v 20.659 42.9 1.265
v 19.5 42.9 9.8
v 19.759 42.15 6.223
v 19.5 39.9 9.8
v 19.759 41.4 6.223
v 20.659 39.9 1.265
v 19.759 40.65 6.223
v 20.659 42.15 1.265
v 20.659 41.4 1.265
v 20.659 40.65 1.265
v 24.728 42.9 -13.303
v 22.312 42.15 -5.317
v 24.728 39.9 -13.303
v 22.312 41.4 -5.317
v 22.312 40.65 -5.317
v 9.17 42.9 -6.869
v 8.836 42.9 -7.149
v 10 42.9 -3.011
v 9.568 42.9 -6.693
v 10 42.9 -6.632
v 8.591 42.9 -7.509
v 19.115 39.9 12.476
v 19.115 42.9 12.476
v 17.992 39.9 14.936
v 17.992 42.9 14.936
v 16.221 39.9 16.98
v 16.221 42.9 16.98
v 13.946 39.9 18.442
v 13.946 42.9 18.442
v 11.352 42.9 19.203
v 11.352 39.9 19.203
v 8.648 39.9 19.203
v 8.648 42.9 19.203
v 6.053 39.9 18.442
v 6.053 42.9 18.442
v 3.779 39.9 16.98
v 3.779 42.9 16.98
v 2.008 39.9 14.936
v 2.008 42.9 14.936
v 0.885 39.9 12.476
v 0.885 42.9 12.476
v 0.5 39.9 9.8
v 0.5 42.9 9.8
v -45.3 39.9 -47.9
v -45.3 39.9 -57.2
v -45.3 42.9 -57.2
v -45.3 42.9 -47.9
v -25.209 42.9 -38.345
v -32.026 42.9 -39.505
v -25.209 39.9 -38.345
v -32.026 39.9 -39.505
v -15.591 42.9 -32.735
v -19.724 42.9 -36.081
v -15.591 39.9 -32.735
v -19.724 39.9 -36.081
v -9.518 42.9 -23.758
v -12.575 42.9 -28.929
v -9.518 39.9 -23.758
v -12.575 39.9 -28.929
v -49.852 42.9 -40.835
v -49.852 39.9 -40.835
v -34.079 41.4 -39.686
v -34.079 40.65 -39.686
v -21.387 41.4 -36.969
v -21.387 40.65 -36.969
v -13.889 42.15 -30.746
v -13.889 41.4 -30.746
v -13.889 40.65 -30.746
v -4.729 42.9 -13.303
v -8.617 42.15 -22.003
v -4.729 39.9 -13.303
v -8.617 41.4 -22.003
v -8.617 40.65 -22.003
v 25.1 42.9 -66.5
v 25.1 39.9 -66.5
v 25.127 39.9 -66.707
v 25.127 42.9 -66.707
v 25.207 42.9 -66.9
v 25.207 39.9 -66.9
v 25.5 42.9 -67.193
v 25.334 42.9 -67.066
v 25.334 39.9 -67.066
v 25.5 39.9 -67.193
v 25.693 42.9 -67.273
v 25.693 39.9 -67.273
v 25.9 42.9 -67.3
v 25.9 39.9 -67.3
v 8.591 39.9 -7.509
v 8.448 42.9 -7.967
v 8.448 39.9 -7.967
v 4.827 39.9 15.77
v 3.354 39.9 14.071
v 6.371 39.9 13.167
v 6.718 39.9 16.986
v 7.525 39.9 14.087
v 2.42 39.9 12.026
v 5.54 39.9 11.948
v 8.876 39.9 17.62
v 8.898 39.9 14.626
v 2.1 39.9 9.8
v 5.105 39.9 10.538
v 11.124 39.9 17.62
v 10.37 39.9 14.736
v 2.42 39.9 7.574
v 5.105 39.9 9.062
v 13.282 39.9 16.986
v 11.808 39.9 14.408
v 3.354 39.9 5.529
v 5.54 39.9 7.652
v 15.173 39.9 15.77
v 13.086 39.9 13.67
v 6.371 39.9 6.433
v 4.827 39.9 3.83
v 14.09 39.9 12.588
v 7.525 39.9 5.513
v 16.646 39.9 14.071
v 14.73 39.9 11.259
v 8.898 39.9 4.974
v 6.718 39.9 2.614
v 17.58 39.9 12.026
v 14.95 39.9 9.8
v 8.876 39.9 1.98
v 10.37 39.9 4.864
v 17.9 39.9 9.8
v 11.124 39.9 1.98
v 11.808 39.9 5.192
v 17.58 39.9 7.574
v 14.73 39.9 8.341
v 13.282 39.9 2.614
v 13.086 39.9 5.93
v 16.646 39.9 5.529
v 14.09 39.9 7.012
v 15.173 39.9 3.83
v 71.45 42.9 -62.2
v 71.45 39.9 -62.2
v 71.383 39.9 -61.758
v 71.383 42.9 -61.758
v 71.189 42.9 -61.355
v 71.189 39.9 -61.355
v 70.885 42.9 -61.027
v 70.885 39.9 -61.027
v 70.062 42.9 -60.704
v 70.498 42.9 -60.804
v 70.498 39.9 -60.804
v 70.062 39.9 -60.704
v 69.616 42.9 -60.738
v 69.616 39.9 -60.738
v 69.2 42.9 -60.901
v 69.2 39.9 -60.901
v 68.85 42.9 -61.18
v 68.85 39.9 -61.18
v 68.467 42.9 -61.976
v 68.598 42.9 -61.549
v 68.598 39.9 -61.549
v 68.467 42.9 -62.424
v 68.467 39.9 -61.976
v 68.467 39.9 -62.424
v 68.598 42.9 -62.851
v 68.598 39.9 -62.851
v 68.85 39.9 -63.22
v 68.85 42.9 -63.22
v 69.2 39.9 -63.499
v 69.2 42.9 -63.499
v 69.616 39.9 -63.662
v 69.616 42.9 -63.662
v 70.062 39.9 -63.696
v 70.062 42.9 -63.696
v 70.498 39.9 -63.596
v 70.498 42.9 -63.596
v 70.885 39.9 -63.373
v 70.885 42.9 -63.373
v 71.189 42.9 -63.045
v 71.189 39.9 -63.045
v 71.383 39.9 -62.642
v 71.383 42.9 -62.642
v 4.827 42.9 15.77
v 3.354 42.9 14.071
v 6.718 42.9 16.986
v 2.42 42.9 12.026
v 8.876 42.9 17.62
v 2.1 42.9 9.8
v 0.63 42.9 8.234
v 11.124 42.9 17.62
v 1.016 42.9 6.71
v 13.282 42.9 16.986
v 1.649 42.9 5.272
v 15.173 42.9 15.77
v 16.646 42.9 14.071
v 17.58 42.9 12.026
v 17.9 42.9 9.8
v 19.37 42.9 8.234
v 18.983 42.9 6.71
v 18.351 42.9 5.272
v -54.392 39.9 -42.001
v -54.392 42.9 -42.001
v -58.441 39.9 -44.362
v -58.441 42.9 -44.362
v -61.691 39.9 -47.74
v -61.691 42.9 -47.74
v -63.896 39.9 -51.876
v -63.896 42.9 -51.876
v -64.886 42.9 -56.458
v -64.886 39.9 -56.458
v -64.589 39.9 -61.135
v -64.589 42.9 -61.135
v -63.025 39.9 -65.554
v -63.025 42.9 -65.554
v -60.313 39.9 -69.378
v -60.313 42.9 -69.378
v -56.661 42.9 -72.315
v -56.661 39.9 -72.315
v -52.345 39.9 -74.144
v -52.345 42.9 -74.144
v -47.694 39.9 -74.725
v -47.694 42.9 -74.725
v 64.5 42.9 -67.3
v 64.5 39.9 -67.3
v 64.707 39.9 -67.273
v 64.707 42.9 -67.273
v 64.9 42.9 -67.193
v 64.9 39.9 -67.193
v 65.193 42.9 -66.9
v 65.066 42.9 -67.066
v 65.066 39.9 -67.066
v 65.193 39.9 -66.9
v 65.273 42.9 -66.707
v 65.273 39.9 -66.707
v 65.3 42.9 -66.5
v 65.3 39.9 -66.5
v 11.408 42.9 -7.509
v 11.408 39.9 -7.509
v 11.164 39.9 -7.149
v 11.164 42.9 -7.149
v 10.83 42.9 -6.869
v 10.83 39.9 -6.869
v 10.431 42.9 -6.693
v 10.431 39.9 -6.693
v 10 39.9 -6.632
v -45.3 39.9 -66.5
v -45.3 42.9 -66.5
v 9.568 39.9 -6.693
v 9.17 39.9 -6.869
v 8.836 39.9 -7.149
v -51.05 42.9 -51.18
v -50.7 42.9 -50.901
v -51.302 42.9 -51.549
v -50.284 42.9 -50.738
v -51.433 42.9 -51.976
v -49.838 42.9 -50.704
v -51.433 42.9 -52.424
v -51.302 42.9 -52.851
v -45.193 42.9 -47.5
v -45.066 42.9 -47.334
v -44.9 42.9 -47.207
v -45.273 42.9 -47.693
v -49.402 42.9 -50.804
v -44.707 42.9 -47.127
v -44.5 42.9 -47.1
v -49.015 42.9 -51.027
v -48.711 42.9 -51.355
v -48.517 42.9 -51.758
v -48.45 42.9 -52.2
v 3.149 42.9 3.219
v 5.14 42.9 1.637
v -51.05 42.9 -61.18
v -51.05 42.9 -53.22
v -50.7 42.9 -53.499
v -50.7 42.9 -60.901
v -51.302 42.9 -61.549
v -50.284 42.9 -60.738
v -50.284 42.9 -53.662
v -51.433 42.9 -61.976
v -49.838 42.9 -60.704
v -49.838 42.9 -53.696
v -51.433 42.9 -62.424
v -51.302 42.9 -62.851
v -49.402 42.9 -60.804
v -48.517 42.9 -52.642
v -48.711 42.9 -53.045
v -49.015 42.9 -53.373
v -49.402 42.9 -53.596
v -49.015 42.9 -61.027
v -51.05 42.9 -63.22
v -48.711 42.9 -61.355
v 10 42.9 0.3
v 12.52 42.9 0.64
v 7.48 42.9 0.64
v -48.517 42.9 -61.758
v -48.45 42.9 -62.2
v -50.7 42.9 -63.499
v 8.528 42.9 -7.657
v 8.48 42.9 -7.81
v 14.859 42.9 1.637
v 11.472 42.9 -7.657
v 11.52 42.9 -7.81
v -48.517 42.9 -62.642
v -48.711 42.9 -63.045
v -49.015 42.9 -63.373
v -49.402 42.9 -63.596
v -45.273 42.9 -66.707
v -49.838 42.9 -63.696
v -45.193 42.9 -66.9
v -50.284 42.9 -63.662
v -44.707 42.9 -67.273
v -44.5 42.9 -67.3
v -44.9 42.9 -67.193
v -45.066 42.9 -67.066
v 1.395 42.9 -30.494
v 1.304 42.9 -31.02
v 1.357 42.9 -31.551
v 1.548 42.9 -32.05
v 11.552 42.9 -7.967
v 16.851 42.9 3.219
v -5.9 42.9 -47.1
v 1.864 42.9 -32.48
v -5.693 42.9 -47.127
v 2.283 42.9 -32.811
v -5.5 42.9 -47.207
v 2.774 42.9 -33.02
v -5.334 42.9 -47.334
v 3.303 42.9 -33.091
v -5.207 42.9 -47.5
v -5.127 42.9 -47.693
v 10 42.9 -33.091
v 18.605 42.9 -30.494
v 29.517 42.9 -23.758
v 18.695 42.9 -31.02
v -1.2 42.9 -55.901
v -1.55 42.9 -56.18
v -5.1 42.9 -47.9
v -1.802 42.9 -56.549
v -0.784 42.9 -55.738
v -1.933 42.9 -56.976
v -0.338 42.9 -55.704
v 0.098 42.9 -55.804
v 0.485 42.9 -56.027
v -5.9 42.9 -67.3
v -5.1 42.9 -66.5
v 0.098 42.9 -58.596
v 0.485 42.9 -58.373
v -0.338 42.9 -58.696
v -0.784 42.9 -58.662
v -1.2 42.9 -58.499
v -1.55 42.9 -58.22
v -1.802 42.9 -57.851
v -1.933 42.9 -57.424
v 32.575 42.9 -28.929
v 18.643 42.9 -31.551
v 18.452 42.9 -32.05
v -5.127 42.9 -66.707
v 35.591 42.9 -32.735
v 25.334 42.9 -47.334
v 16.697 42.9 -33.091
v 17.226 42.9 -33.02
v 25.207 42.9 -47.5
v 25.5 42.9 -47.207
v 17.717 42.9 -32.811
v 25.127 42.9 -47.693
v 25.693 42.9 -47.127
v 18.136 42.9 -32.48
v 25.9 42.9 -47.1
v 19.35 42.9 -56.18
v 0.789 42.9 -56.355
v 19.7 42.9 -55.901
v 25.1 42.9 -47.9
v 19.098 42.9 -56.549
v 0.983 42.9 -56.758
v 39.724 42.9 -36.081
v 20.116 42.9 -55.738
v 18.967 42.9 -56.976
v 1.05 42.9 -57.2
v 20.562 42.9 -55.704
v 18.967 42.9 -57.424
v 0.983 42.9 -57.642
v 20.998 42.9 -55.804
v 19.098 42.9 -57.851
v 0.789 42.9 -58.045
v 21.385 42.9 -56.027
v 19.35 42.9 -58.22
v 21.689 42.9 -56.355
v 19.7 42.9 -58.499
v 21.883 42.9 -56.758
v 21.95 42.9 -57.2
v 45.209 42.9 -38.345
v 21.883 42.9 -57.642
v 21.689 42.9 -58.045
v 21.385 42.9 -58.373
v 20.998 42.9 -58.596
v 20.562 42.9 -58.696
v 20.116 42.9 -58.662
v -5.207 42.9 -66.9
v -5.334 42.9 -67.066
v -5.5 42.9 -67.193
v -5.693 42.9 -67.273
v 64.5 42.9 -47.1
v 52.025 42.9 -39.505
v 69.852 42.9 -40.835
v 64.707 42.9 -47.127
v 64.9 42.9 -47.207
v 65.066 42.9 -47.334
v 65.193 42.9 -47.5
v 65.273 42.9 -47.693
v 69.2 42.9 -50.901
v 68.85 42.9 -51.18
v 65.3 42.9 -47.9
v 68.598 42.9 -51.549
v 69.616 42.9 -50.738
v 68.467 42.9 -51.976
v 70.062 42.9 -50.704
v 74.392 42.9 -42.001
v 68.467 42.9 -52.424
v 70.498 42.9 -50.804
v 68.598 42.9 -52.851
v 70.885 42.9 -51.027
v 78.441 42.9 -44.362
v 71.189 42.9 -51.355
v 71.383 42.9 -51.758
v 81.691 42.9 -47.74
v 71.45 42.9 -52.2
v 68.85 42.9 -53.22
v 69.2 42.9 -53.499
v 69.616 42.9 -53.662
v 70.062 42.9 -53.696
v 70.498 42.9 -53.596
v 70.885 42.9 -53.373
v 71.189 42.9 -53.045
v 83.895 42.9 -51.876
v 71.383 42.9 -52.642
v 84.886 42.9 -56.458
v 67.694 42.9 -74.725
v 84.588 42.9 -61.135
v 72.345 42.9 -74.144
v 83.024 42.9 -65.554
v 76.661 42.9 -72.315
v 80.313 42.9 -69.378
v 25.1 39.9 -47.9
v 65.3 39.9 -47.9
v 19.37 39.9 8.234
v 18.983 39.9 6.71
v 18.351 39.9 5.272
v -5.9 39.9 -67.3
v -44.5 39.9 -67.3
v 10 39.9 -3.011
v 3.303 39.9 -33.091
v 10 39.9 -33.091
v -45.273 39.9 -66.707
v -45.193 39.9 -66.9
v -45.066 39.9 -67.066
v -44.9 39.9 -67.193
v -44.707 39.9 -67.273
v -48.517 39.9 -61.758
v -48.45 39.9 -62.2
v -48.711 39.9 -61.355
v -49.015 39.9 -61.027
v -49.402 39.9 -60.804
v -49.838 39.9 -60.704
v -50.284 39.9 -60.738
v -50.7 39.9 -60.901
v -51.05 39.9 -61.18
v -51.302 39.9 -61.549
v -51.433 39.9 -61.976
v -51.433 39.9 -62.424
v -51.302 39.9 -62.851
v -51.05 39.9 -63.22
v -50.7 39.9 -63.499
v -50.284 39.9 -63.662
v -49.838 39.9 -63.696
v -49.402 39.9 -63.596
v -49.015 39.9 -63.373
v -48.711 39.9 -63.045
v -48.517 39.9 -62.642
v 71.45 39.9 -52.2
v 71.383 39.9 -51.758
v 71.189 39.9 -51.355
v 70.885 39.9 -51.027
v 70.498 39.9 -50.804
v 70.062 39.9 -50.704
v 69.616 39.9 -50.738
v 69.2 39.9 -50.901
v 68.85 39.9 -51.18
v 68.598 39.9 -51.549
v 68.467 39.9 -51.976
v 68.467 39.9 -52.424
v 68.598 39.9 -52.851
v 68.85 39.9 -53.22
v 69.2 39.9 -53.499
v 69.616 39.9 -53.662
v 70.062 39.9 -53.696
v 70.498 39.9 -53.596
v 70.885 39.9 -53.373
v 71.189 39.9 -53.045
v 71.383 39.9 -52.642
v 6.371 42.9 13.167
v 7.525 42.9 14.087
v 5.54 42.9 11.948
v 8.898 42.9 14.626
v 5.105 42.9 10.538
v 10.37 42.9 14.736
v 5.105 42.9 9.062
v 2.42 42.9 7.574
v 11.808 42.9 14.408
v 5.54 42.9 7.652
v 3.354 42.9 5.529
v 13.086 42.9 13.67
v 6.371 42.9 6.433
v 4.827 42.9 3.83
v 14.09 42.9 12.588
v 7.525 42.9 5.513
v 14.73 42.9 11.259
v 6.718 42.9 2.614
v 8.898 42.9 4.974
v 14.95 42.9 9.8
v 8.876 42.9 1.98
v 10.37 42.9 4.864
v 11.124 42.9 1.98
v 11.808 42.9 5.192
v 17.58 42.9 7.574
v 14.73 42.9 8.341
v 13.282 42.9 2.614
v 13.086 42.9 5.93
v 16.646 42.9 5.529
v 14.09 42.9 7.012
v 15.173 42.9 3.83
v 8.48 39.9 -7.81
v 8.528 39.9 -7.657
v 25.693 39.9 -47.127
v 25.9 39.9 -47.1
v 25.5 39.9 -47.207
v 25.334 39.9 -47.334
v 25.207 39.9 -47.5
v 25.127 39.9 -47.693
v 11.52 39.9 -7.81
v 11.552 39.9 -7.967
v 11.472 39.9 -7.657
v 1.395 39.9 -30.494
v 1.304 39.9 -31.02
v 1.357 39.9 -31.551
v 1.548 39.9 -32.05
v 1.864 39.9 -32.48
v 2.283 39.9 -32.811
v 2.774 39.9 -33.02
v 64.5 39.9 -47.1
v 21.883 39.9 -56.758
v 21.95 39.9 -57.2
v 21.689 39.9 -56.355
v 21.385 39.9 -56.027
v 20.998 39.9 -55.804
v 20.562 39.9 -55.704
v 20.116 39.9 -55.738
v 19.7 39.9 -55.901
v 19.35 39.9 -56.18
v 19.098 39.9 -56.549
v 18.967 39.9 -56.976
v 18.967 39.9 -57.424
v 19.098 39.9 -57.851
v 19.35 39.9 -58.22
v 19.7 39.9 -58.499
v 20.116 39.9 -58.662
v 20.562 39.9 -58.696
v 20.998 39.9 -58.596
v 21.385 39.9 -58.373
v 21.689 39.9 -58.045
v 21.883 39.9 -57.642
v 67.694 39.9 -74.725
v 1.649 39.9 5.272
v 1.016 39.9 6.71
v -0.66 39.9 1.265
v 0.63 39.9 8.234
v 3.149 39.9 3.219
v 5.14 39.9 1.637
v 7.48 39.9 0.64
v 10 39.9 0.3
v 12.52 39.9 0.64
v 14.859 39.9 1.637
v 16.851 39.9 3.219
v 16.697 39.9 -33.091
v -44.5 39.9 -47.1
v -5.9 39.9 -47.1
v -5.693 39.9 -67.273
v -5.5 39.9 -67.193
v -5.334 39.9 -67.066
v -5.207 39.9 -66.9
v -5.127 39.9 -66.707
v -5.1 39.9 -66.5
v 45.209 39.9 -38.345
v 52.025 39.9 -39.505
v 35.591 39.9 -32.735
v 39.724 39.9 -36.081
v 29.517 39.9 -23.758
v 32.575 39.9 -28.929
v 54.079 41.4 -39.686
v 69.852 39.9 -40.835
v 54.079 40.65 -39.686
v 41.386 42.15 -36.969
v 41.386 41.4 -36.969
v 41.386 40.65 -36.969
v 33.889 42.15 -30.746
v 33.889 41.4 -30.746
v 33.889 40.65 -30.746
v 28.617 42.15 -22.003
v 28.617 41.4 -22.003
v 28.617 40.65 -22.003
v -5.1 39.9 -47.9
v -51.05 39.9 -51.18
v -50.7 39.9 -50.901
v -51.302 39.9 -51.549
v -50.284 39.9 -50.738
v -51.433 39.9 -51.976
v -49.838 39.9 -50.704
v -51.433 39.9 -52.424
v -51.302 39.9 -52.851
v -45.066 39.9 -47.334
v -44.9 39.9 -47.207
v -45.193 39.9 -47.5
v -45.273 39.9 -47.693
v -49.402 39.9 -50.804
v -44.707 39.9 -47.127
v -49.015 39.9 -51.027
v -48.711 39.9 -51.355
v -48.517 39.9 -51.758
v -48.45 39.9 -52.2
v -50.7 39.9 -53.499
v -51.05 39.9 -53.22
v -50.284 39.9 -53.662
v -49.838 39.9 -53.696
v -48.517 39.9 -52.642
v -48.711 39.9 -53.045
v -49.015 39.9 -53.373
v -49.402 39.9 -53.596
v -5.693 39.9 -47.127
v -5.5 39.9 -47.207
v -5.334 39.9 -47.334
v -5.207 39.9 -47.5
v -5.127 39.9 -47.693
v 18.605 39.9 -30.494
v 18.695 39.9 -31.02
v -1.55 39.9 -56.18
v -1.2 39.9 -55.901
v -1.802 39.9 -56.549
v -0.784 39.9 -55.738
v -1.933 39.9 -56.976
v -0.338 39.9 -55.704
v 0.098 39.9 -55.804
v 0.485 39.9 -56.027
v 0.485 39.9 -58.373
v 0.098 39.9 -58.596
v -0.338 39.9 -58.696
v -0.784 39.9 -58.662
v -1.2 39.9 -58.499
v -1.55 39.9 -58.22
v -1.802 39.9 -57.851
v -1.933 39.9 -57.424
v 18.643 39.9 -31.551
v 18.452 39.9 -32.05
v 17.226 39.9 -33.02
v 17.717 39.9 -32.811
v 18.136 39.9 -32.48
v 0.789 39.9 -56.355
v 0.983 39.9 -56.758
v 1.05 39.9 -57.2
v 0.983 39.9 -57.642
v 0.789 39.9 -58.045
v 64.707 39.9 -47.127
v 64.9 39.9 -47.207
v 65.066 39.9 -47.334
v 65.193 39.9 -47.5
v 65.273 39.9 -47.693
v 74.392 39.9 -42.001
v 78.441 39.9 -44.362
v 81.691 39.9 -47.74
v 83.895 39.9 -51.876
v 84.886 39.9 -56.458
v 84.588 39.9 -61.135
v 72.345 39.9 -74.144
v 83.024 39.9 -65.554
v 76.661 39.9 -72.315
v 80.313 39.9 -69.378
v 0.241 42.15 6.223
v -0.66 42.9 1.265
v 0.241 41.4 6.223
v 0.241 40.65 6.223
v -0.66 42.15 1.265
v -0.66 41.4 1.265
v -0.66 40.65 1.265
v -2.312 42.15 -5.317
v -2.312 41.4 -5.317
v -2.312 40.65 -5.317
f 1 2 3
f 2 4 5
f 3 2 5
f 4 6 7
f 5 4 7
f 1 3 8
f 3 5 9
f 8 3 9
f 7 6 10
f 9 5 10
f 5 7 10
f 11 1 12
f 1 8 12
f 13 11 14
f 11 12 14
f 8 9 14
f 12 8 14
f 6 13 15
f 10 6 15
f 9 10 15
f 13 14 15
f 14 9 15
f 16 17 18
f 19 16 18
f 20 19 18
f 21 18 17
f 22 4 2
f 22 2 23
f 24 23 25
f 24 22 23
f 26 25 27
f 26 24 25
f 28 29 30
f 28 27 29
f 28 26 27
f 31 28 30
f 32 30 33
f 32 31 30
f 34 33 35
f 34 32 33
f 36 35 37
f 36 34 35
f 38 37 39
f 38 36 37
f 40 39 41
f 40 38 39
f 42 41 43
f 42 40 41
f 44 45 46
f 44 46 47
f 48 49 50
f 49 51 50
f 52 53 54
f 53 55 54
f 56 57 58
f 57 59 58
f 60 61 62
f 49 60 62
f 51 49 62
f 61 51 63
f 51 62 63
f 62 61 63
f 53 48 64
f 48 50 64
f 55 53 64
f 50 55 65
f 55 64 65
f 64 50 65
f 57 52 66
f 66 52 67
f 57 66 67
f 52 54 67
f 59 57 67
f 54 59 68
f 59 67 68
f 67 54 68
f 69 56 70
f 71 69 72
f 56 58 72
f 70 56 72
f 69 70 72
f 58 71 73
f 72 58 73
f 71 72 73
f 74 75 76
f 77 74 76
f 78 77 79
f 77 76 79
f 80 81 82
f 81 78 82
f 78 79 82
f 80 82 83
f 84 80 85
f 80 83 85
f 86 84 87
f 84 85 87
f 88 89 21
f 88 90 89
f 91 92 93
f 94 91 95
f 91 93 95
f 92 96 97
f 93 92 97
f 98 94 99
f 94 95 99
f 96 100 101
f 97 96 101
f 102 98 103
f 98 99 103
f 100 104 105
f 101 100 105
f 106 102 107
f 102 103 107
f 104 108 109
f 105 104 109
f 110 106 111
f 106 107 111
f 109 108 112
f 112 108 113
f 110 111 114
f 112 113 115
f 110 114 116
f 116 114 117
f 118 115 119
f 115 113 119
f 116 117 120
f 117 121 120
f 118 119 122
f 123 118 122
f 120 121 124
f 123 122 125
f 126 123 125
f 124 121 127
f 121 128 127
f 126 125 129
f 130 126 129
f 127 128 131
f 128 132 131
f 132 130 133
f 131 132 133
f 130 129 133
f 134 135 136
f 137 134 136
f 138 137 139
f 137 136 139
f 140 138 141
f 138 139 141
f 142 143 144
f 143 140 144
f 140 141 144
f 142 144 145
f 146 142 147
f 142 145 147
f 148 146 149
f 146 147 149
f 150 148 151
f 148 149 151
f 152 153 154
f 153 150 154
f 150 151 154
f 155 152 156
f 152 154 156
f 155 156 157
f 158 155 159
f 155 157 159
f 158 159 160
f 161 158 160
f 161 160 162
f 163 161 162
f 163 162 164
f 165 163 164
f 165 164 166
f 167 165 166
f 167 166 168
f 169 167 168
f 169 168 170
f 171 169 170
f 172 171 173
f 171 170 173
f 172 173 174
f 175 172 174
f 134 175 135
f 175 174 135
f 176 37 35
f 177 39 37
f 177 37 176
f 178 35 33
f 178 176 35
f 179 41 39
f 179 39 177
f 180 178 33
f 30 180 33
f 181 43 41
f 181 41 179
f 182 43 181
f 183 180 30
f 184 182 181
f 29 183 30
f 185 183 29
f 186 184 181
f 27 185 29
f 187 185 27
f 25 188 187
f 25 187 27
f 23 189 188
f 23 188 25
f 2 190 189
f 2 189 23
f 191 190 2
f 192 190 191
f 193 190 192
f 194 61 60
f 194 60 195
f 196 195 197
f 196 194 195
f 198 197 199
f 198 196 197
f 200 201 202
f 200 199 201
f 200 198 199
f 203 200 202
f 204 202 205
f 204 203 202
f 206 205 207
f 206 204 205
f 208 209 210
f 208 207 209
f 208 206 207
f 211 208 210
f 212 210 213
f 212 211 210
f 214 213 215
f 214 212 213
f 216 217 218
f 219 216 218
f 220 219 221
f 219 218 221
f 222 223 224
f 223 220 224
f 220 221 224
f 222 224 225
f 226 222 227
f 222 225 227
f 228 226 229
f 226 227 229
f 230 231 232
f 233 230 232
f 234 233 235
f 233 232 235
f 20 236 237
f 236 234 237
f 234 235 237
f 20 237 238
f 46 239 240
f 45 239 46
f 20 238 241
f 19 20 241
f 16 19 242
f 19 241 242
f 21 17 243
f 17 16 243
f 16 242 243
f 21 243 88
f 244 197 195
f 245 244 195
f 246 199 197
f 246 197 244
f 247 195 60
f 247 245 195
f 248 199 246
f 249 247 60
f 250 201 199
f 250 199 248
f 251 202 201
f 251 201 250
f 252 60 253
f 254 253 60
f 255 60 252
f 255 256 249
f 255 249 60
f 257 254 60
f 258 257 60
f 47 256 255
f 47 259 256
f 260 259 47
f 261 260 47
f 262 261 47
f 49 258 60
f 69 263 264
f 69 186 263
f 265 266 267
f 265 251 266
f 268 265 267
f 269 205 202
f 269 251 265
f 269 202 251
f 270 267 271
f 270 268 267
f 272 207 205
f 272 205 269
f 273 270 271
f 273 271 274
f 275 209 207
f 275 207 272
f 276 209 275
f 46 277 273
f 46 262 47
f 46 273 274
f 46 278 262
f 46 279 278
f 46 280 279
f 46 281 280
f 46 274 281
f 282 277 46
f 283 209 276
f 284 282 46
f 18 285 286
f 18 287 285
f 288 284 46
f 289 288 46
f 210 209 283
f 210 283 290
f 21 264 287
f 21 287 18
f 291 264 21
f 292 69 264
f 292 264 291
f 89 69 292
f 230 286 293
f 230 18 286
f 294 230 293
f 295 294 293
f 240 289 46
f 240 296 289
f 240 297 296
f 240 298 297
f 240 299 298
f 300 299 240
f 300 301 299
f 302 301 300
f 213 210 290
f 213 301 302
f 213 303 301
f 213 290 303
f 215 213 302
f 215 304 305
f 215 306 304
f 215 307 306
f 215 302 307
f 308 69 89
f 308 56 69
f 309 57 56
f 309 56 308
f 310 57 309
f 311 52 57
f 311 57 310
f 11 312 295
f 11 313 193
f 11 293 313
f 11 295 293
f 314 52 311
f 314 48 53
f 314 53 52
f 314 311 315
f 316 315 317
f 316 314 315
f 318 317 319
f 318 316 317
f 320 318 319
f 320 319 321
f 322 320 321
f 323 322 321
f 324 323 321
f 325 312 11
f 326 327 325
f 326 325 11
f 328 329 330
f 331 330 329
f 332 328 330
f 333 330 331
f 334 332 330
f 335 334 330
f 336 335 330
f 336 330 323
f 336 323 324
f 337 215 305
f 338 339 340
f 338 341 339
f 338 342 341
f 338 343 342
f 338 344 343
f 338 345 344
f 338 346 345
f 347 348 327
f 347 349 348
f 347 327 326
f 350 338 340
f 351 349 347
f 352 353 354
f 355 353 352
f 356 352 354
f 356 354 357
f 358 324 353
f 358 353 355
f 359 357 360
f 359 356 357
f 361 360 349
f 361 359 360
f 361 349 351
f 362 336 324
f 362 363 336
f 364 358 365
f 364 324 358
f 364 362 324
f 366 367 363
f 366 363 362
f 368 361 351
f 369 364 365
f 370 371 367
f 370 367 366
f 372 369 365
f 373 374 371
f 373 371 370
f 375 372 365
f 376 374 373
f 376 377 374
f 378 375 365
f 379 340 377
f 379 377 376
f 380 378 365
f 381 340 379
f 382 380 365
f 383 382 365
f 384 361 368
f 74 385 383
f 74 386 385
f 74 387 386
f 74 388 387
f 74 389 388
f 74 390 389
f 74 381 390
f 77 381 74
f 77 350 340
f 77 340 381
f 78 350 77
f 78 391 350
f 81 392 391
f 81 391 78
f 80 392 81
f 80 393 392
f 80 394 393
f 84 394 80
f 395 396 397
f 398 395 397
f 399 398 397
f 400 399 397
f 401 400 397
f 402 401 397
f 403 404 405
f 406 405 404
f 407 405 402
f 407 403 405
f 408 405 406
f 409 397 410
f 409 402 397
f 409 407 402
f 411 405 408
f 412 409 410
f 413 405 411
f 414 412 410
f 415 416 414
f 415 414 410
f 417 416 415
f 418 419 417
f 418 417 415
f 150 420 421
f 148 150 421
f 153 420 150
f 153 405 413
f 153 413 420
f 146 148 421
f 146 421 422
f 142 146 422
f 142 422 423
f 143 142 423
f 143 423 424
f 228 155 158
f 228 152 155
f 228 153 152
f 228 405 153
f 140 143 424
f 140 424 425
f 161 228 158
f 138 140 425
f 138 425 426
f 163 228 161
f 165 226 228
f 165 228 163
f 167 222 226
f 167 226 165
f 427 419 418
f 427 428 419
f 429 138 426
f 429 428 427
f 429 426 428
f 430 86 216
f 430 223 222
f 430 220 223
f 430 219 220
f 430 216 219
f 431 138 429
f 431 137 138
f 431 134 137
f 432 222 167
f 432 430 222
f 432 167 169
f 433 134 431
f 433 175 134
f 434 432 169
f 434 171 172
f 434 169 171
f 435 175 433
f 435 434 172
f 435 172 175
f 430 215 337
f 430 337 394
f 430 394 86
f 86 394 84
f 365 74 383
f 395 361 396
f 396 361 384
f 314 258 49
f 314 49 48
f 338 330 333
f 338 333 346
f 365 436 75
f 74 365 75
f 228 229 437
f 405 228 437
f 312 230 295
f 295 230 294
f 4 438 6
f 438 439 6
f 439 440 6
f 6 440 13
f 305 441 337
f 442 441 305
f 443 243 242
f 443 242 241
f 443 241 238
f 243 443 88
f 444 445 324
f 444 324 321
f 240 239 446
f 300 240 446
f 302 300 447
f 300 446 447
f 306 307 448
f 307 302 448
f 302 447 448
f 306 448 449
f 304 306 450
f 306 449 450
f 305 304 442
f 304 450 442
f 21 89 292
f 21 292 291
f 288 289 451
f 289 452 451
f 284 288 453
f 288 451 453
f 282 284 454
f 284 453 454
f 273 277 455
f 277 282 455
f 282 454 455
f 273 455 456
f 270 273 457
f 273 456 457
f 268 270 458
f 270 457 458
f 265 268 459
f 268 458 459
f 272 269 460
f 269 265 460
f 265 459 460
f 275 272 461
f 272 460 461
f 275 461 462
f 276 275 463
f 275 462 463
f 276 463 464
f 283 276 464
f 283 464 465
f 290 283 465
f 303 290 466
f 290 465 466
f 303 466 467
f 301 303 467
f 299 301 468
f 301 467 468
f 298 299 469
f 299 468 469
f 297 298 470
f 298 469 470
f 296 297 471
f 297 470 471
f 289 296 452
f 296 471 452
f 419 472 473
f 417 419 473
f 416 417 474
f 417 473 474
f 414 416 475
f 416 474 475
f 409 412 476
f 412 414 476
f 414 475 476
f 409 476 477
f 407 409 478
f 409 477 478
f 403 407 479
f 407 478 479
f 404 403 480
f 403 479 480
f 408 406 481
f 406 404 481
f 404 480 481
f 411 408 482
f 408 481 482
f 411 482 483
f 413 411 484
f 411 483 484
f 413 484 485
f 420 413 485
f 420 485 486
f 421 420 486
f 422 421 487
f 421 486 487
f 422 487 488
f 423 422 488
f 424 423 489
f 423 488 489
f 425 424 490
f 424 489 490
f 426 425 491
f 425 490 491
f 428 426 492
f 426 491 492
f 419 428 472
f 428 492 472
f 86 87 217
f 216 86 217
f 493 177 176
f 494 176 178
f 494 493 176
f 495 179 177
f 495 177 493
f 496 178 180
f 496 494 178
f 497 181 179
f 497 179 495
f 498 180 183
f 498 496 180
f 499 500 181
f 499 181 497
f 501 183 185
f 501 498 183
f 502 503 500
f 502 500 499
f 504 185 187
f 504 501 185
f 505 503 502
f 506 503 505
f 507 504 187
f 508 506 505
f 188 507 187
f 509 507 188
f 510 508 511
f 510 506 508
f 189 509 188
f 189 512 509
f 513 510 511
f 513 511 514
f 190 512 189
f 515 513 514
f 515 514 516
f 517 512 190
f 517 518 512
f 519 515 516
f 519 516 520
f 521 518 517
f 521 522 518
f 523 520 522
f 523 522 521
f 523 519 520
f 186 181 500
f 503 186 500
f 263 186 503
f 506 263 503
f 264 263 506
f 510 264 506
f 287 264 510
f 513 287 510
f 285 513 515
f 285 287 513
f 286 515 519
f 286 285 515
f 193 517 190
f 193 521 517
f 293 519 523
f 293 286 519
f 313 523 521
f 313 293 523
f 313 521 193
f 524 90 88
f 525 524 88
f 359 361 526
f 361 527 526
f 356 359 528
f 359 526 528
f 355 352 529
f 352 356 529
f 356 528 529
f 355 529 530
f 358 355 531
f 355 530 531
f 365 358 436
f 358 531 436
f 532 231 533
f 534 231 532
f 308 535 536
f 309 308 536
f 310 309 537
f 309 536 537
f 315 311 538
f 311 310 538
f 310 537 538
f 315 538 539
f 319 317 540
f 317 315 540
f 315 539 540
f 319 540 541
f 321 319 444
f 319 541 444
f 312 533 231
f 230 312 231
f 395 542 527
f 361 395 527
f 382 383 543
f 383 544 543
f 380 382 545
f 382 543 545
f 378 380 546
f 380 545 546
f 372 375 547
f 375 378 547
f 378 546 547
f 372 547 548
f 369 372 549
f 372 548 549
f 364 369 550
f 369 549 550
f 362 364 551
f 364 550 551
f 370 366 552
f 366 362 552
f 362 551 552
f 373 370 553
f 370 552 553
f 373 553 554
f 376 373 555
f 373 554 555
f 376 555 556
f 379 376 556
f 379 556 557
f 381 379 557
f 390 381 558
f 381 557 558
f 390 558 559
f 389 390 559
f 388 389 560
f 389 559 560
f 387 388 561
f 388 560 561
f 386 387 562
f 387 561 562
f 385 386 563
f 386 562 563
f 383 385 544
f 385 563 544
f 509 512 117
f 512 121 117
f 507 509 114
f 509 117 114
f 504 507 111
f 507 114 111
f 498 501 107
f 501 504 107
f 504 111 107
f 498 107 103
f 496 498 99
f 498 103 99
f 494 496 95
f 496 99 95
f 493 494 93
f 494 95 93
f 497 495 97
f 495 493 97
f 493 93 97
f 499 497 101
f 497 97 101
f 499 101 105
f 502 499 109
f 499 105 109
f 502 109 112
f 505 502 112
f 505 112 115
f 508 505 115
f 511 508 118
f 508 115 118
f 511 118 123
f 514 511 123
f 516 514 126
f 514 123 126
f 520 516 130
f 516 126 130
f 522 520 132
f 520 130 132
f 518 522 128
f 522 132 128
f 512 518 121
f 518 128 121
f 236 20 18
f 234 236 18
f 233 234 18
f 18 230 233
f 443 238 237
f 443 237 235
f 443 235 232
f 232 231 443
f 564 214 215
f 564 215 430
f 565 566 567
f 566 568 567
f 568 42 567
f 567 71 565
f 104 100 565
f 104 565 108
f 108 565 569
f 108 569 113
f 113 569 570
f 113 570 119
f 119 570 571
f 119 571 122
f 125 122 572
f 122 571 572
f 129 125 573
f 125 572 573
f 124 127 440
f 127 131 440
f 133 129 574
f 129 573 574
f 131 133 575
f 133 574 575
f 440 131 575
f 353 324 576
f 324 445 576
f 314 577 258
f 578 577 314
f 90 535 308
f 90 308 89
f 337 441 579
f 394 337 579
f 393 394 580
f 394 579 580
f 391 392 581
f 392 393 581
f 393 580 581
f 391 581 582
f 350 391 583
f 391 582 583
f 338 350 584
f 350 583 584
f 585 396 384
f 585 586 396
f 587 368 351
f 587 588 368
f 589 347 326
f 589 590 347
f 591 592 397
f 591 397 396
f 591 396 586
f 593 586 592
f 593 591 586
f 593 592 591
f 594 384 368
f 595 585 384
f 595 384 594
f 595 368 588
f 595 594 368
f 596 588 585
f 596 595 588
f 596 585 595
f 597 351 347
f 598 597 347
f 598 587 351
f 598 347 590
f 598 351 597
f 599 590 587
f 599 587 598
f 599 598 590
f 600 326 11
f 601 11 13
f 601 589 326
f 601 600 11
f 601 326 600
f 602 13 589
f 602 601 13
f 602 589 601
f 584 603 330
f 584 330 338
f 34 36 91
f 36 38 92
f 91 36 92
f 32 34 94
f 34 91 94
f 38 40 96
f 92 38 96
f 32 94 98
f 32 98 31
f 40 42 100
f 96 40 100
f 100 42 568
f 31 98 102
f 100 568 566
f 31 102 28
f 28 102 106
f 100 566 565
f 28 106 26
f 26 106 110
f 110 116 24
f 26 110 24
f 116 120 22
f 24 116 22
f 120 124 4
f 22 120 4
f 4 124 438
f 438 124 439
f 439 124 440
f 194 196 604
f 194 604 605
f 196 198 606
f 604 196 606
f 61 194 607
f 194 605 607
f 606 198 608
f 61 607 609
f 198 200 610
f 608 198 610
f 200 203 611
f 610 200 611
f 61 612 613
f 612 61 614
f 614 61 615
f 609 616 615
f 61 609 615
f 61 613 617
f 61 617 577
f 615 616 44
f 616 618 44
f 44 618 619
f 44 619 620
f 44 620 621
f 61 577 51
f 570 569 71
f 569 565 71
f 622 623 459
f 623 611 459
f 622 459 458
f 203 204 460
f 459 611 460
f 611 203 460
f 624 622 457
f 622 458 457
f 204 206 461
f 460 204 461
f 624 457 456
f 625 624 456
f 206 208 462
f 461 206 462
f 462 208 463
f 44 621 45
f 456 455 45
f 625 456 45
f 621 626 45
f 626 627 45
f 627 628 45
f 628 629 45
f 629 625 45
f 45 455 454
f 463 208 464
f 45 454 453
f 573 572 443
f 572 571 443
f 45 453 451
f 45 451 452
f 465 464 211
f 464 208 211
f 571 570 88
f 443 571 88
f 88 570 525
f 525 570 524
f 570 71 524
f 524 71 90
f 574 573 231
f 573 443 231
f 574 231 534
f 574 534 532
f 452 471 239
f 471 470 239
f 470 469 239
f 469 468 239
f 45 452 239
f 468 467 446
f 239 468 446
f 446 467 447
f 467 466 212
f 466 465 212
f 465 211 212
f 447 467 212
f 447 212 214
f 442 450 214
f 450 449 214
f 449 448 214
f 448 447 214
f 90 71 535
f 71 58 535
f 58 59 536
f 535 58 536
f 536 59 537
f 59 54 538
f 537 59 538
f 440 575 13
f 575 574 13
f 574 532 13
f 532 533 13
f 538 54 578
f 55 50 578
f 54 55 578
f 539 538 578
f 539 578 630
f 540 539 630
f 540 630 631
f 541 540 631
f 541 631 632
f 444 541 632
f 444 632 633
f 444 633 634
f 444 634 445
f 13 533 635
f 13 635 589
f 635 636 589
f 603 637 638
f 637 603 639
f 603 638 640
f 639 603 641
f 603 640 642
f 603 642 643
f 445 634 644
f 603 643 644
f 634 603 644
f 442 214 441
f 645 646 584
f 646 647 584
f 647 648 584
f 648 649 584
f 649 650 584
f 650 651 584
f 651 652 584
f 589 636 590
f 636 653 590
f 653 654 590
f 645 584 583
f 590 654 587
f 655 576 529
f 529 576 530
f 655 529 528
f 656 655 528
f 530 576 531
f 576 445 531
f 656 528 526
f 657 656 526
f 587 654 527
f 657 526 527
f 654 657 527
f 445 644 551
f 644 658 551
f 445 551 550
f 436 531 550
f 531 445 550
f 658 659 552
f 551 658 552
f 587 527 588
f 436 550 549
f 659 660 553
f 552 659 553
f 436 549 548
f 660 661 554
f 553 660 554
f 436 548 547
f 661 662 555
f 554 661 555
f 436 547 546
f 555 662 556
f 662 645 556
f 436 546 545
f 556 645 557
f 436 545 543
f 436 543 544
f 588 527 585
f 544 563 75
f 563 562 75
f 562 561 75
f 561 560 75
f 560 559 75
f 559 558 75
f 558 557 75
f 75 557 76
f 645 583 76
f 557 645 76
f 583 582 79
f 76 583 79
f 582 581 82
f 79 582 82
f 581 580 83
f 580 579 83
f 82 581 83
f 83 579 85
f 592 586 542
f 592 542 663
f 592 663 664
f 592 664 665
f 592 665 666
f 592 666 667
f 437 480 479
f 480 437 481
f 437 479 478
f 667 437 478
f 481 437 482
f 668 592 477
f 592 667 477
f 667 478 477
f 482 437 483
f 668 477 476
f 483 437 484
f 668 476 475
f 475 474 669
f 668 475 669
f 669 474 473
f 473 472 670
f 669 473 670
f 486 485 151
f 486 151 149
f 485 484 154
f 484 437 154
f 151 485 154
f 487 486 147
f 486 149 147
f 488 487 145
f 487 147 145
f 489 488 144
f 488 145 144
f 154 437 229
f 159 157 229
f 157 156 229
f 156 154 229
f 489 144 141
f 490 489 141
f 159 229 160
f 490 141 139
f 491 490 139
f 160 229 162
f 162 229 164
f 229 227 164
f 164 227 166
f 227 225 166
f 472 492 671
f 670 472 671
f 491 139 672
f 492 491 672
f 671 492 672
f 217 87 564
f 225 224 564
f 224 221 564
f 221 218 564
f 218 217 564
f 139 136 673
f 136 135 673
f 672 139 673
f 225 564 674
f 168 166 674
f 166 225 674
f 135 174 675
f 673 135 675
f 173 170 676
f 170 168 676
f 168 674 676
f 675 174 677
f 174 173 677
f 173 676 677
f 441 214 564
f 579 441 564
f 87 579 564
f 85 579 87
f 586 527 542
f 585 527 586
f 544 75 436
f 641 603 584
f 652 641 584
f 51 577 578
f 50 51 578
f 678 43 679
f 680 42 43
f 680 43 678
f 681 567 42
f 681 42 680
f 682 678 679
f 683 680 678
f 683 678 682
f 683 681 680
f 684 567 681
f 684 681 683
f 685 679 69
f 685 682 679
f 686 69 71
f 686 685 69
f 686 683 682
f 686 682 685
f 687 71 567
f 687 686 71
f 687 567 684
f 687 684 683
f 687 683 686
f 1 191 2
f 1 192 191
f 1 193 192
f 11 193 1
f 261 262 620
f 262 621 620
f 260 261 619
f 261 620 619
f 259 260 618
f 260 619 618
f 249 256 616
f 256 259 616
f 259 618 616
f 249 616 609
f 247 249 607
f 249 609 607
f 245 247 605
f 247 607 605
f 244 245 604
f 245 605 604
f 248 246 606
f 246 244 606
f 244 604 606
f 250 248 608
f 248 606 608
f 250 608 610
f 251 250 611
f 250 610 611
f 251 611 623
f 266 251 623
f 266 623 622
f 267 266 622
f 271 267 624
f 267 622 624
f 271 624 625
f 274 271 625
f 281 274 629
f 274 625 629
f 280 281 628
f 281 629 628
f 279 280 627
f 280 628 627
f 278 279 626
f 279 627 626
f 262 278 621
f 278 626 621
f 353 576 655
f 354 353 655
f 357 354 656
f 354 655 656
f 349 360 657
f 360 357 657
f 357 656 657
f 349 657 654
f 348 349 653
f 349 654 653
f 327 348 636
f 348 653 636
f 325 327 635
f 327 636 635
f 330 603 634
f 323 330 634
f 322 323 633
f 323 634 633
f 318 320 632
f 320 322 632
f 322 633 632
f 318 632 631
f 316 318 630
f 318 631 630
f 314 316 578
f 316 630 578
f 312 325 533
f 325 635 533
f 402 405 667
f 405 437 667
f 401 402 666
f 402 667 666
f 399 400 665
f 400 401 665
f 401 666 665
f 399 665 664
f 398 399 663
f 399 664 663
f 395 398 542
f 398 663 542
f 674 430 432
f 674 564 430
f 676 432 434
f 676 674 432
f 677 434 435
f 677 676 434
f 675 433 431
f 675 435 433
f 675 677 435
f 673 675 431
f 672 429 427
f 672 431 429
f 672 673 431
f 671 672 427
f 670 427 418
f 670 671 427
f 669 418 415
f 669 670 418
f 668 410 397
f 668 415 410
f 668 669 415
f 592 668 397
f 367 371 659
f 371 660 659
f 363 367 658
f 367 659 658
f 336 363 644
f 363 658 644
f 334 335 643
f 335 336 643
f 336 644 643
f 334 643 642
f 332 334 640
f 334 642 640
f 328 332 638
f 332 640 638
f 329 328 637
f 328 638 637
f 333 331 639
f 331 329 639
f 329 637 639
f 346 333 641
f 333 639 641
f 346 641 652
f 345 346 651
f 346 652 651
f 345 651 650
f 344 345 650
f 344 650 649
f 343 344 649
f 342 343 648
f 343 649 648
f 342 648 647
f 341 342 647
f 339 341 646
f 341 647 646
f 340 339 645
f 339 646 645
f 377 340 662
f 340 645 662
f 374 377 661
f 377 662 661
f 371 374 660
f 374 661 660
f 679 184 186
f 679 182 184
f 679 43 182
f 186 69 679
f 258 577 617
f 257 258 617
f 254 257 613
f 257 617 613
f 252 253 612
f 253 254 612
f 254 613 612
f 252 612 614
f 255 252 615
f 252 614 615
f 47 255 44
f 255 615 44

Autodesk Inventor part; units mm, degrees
ref_plane "YZ Plane" through (0, 0, 0) normal (1, 0, 0) x (0, 1, 0)
ref_plane "XZ Plane" through (0, 0, 0) normal (0, 1, 0) x (-1, 0, 0)
ref_plane "Work Plane7" through (3.7071, 39.9, 0.5) normal (0, 1, 0) x (1, 0, 0)
sketch "Sketch4" plane through (3.7071, 39.9, 0.5) normal (0, 1, 0) x (1, 0, 0)
  circle A0 centre (6.2928, -9.3) radius 2.9
  circle A1 centre (6.2928, -9.3) radius 2.65
  line L0 (6.2928, -9.3) -> (6.2928, -8.1563)
  circle A2 centre (6.2928, -9.3) radius 1.5
  line L1 (5.9607, -6.6709) -> (6.3303, -6.4003)
  line L2 (6.6249, -6.6709) -> (6.3303, -6.4003)
  line L3 (5.3173, -6.8361) -> (5.608, -6.482)
  line L4 (5.9607, -6.6709) -> (5.608, -6.482)
  line L5 (4.7352, -7.1561) -> (4.9287, -6.7409)
  line L6 (5.3173, -6.8361) -> (4.9287, -6.7409)
  line L7 (4.2509, -7.6109) -> (4.3351, -7.1605)
  line L8 (4.7352, -7.1561) -> (4.3351, -7.1605)
  line L9 (3.895, -8.1717) -> (3.8646, -7.7146)
  line L10 (4.2509, -7.6109) -> (3.8646, -7.7146)
  line L11 (3.6897, -8.8035) -> (3.5466, -8.3682)
  line L12 (3.895, -8.1717) -> (3.5466, -8.3682)
  line L13 (3.648, -9.4664) -> (3.4011, -9.0805)
  line L14 (3.6897, -8.8035) -> (3.4011, -9.0805)
  line L15 (3.7725, -10.1189) -> (3.4374, -9.8065)
  line L16 (3.648, -9.4664) -> (3.4374, -9.8065)
  line L17 (4.0553, -10.72) -> (3.653, -10.5007)
  line L18 (3.7725, -10.1189) -> (3.653, -10.5007)
  line L19 (4.4787, -11.2318) -> (4.0346, -11.1195)
  line L20 (4.0553, -10.72) -> (4.0346, -11.1195)
  line L21 (5.0161, -11.6222) -> (4.558, -11.6239)
  line L22 (4.4787, -11.2318) -> (4.558, -11.6239)
  line L23 (5.6338, -11.8668) -> (5.1904, -11.9823)
  line L24 (5.0161, -11.6222) -> (5.1904, -11.9823)
  line L25 (6.2928, -11.95) -> (5.8921, -12.1722)
  line L26 (5.6338, -11.8668) -> (5.8921, -12.1722)
  line L27 (6.9518, -11.8668) -> (6.619, -12.1816)
  line L28 (6.2928, -11.95) -> (6.619, -12.1816)
  line L29 (7.5694, -11.6222) -> (7.3254, -12.01)
  line L30 (6.9518, -11.8668) -> (7.3254, -12.01)
  line L31 (8.1068, -11.2318) -> (7.9668, -11.6681)
  line L32 (7.5694, -11.6222) -> (7.9668, -11.6681)
  line L33 (8.5303, -10.72) -> (8.5032, -11.1773)
  line L34 (8.1068, -11.2318) -> (8.5032, -11.1773)
  line L35 (8.8131, -10.1189) -> (8.9006, -10.5687)
  line L36 (8.5303, -10.72) -> (8.9006, -10.5687)
  line L37 (8.9376, -9.4664) -> (9.1341, -9.8803)
  line L38 (8.8131, -10.1189) -> (9.1341, -9.8803)
  line L39 (8.8959, -8.8035) -> (9.1892, -9.1554)
  line L40 (8.9376, -9.4664) -> (9.1892, -9.1554)
  line L41 (8.6906, -8.1717) -> (9.0622, -8.4397)
  line L42 (8.8959, -8.8035) -> (9.0622, -8.4397)
  line L43 (8.3346, -7.6109) -> (8.7613, -7.778)
  line L44 (8.6906, -8.1717) -> (8.7613, -7.778)
  line L45 (7.8504, -7.1561) -> (8.3052, -7.2119)
  line L46 (8.3346, -7.6109) -> (8.3052, -7.2119)
  line L47 (7.2683, -6.8361) -> (7.7227, -6.777)
  line L48 (7.8504, -7.1561) -> (7.7227, -6.777)
  line L49 (6.6249, -6.6709) -> (7.0503, -6.5007)
  line L50 (7.2683, -6.8361) -> (7.0503, -6.5007)
  line L51 (-48.7072, 67.5) -> (-9.1072, 67.5)
  line L52 (-9.1072, 67.5) -> (-9.1072, 47.9)
  line L53 (-9.1072, 47.9) -> (-48.7072, 47.9)
  line L54 (-48.7072, 47.9) -> (-48.7072, 67.5)
  line L55 (-9.6072, 67.8) -> (-48.2072, 67.8)
  line L56 (-49.0072, 67) -> (-49.0072, 48.4)
  line L57 (-48.2072, 47.6) -> (-9.6072, 47.6)
  line L58 (-8.8072, 48.4) -> (-8.8072, 67)
  arc A3 (-48.2072, 67.8) -> (-49.0072, 67) centre (-48.2072, 67) ccw
  arc A4 (-49.0072, 48.4) -> (-48.2072, 47.6) centre (-48.2072, 48.4) ccw
  arc A5 (-8.8072, 67) -> (-9.6072, 67.8) centre (-9.6072, 67) ccw
  arc A6 (-9.6072, 47.6) -> (-8.8072, 48.4) centre (-9.6072, 48.4) ccw
  circle A7 centre (-38.7072, 57.7) radius 2.8043
  line L59 (-28.9072, 67.5) -> (-28.9072, 60.5718)
  arc A8 (-51.4012, 75.2248) -> (-53.5593, 41.3351) centre (-51.641, 58.2265) ccw
  arc A9 (14.1928, -9.3) -> (-1.6072, -9.3) centre (6.2928, -9.3) ccw
  line L60 (-53.5593, 41.3351) -> (-46.7288, 40.1839) construction
  line L61 (-46.7288, 40.1839) -> (-26.4146, 41.3143) construction
  line L62 (-26.4146, 41.3143) -> (-16.8338, 33.5272) construction
  line L63 (-16.8338, 33.5272) -> (-7.2254, 12.1154) construction
  line L64 (-7.2254, 12.1154) -> (-2.9491, -1.4) construction
  line L65 (-2.9491, -1.4) -> (-1.6072, -5.4747) construction
  line L66 (-1.6072, -5.4747) -> (-1.6072, -9.3) construction
  spline S0 degree 4 poles (-53.5593, 41.3351) (-46.7288, 40.1839) (-26.4146, 41.3143) (-16.8338, 33.5272) (-7.2254, 12.1154) (-2.9491, -1.4) (-1.6072, -5.4747) (-1.6072, -9.3) knots 1 1 1 1 1 2 3 4 5 5 5 5 5
  line L67 (61.2928, 67.5) -> (21.6928, 67.5)
  line L68 (21.6928, 67.5) -> (21.6928, 47.9)
  line L69 (21.6928, 47.9) -> (61.2928, 47.9)
  line L70 (61.2928, 47.9) -> (61.2928, 67.5)
  line L71 (22.1928, 67.8) -> (60.7928, 67.8)
  line L72 (61.5928, 67) -> (61.5928, 48.4)
  line L73 (60.7928, 47.6) -> (22.1928, 47.6)
  line L74 (21.3928, 48.4) -> (21.3928, 67)
  arc A10 (61.5928, 67) -> (60.7928, 67.8) centre (60.7928, 67) ccw
  arc A11 (60.7928, 47.6) -> (61.5928, 48.4) centre (60.7928, 48.4) ccw
  arc A12 (22.1928, 67.8) -> (21.3928, 67) centre (22.1928, 67) ccw
  arc A13 (21.3928, 48.4) -> (22.1928, 47.6) centre (22.1928, 48.4) ccw
  circle A14 centre (51.2928, 57.7) radius 2.8043
  line L75 (41.4928, 67.5) -> (41.4928, 60.5718)
  arc A15 (66.1449, 41.3351) -> (63.9868, 75.2248) centre (64.2266, 58.2265) ccw
  line L76 (66.1449, 41.3351) -> (59.3144, 40.1839) construction
  line L77 (59.3144, 40.1839) -> (39.0002, 41.3143) construction
  line L78 (39.0002, 41.3143) -> (29.4194, 33.5272) construction
  line L79 (29.4194, 33.5272) -> (19.811, 12.1154) construction
  line L80 (19.811, 12.1154) -> (15.5347, -1.4) construction
  line L81 (15.5347, -1.4) -> (14.1928, -5.4747) construction
  line L82 (14.1928, -5.4747) -> (14.1928, -9.3) construction
  spline S1 degree 4 poles (66.1449, 41.3351) (59.3144, 40.1839) (39.0002, 41.3143) (29.4194, 33.5272) (19.811, 12.1154) (15.5347, -1.4) (14.1928, -5.4747) (14.1928, -9.3) knots 1 1 1 1 1 2 3 4 5 5 5 5 5
  arc A16 (-1.6072, -9.3) -> (14.1928, -9.3) centre (6.2928, -9.3) ccw
  circle A17 centre (-53.6572, 62.7) radius 1.5
  line L83 (-49.0072, 57.7) -> (-54.6618, 57.7)
  circle A18 centre (-53.6572, 52.7) radius 1.5
  circle A19 centre (66.2428, 62.7) radius 1.5
  circle A20 centre (66.2428, 52.7) radius 1.5
  circle A21 centre (6.2928, -9.3) radius 4.95
  line L84 (-4.1572, 57.7) -> (-3.4323, 57.7)
  circle A22 centre (-4.1572, 57.7) radius 1.5
  circle A23 centre (16.7428, 57.7) radius 1.5
  line L85 (-51.4012, 75.2248) -> (63.9868, 75.2248)
  circle A24 centre (6.2928, -9.3) radius 9.5
  line L86 (-3.2072, -9.3) -> (-3.2072, -6.2163) construction
  line L87 (-3.2072, -6.2163) -> (-3.7947, -2.1829) construction
  line L88 (-3.7947, -2.1829) -> (-5.6572, 5.3052) construction
  line L89 (-5.6572, 5.3052) -> (-8.4358, 13.8026) construction
  spline S2 degree 4 poles (-3.2072, -9.3) (-3.2072, -6.2163) (-3.7947, -2.1829) (-5.6572, 5.3052) (-8.4358, 13.8026) knots 1 1 1 1 1 2 2 2 2 2
  line L90 (15.7928, -9.3) -> (15.7928, -6.2163) construction
  line L91 (15.7928, -6.2163) -> (16.3803, -2.1829) construction
  line L92 (16.3803, -2.1829) -> (18.2428, 5.3052) construction
  line L93 (18.2428, 5.3052) -> (21.0213, 13.8026) construction
  spline S3 degree 4 poles (15.7928, -9.3) (15.7928, -6.2163) (16.3803, -2.1829) (18.2428, 5.3052) (21.0213, 13.8026) knots 1 1 1 1 1 2 2 2 2 2
  line L94 (6.2928, 52.7) -> (6.2928, 2.4423)
  line L95 (6.2928, 33.5913) -> (-0.4039, 33.5913)
  line L96 (-2.3125, 30.9937) -> (6.2928, 3.511)
  arc A25 (-0.4039, 33.5913) -> (-2.3125, 30.9937) centre (-0.4039, 31.5913) ccw
  line L97 (6.2928, 33.5913) -> (12.9895, 33.5913)
  line L98 (14.8981, 30.9937) -> (6.2928, 3.511)
  arc A26 (14.8981, 30.9937) -> (12.9895, 33.5913) centre (12.9895, 31.5913) ccw
  arc A27 (4.7409, 8.4673) -> (7.8447, 8.4673) centre (6.2928, 8.7018) ccw
  point P0 (6.2928, -6.65)
  point P1 (-28.9072, 64.0359)
  point P2 (41.4928, 64.0359)
  point P3 (8.8959, -8.8035)
  point P4 (8.8131, -10.1189)
  point P5 (8.1068, -11.2318)
  point P6 (7.5694, -11.6222)
  point P7 (6.6249, -6.6709)
  point P8 (8.9006, -10.5687)
  point P9 (3.4374, -9.8065)
  point P10 (8.9006, -10.5687)
  point P11 (3.4374, -9.8065)
  point P12 (3.653, -10.5007)
  point P13 (7.9668, -11.6681)
  point P14 (3.653, -10.5007)
  point P15 (7.3254, -12.01)
  point P16 (7.9668, -11.6681)
  point P17 (6.619, -12.1816)
  point P18 (7.3254, -12.01)
  point P19 (6.619, -12.1816)
  point P20 (6.2928, -17.2)
  point P21 (21.0213, 13.8026)
  point P22 (7.7013, 8.0093)
  point P23 (4.8843, 8.0093)
  dimension "d26" = 5.8
  dimension "d105" = 19
  dimension "d31" = 0.25
  dimension "d32" = 3
  dimension "d36" = 360
  dimension "d68" = 45
  dimension "d69" = 67
  dimension "d70" = 39.6
  dimension "d71" = 19.6
  dimension "d72" = 10
  dimension "d73" = 9.8
  dimension "d74" = 0.3
  dimension "d75" = 0.8
  dimension "d78" = 5
  dimension "d91" = 24.75
  dimension "d92" = 3
  dimension "d93" = 5
  dimension "d99" = 9.9
  dimension "d102" = 3
  dimension "d104" = 17
  dimension "d106" = 2
extrude "Extrusion9" add sketch "Sketch4" along normal blind 3 contours L85 A15 S1 A24 S0 A8 | S0 A24 S2 | A24 S1 A9 S0 | S0 A16 S1 A24 | S3 A24 S1 | A9 A16 | A27 L98 L94 | L94 L96 A27 | A27 L96 | L98 A27
equation "\"d73\" = 0.5 * d71"
properties part number "Shoulder_bottom" material "Thermoplastic Resin"
